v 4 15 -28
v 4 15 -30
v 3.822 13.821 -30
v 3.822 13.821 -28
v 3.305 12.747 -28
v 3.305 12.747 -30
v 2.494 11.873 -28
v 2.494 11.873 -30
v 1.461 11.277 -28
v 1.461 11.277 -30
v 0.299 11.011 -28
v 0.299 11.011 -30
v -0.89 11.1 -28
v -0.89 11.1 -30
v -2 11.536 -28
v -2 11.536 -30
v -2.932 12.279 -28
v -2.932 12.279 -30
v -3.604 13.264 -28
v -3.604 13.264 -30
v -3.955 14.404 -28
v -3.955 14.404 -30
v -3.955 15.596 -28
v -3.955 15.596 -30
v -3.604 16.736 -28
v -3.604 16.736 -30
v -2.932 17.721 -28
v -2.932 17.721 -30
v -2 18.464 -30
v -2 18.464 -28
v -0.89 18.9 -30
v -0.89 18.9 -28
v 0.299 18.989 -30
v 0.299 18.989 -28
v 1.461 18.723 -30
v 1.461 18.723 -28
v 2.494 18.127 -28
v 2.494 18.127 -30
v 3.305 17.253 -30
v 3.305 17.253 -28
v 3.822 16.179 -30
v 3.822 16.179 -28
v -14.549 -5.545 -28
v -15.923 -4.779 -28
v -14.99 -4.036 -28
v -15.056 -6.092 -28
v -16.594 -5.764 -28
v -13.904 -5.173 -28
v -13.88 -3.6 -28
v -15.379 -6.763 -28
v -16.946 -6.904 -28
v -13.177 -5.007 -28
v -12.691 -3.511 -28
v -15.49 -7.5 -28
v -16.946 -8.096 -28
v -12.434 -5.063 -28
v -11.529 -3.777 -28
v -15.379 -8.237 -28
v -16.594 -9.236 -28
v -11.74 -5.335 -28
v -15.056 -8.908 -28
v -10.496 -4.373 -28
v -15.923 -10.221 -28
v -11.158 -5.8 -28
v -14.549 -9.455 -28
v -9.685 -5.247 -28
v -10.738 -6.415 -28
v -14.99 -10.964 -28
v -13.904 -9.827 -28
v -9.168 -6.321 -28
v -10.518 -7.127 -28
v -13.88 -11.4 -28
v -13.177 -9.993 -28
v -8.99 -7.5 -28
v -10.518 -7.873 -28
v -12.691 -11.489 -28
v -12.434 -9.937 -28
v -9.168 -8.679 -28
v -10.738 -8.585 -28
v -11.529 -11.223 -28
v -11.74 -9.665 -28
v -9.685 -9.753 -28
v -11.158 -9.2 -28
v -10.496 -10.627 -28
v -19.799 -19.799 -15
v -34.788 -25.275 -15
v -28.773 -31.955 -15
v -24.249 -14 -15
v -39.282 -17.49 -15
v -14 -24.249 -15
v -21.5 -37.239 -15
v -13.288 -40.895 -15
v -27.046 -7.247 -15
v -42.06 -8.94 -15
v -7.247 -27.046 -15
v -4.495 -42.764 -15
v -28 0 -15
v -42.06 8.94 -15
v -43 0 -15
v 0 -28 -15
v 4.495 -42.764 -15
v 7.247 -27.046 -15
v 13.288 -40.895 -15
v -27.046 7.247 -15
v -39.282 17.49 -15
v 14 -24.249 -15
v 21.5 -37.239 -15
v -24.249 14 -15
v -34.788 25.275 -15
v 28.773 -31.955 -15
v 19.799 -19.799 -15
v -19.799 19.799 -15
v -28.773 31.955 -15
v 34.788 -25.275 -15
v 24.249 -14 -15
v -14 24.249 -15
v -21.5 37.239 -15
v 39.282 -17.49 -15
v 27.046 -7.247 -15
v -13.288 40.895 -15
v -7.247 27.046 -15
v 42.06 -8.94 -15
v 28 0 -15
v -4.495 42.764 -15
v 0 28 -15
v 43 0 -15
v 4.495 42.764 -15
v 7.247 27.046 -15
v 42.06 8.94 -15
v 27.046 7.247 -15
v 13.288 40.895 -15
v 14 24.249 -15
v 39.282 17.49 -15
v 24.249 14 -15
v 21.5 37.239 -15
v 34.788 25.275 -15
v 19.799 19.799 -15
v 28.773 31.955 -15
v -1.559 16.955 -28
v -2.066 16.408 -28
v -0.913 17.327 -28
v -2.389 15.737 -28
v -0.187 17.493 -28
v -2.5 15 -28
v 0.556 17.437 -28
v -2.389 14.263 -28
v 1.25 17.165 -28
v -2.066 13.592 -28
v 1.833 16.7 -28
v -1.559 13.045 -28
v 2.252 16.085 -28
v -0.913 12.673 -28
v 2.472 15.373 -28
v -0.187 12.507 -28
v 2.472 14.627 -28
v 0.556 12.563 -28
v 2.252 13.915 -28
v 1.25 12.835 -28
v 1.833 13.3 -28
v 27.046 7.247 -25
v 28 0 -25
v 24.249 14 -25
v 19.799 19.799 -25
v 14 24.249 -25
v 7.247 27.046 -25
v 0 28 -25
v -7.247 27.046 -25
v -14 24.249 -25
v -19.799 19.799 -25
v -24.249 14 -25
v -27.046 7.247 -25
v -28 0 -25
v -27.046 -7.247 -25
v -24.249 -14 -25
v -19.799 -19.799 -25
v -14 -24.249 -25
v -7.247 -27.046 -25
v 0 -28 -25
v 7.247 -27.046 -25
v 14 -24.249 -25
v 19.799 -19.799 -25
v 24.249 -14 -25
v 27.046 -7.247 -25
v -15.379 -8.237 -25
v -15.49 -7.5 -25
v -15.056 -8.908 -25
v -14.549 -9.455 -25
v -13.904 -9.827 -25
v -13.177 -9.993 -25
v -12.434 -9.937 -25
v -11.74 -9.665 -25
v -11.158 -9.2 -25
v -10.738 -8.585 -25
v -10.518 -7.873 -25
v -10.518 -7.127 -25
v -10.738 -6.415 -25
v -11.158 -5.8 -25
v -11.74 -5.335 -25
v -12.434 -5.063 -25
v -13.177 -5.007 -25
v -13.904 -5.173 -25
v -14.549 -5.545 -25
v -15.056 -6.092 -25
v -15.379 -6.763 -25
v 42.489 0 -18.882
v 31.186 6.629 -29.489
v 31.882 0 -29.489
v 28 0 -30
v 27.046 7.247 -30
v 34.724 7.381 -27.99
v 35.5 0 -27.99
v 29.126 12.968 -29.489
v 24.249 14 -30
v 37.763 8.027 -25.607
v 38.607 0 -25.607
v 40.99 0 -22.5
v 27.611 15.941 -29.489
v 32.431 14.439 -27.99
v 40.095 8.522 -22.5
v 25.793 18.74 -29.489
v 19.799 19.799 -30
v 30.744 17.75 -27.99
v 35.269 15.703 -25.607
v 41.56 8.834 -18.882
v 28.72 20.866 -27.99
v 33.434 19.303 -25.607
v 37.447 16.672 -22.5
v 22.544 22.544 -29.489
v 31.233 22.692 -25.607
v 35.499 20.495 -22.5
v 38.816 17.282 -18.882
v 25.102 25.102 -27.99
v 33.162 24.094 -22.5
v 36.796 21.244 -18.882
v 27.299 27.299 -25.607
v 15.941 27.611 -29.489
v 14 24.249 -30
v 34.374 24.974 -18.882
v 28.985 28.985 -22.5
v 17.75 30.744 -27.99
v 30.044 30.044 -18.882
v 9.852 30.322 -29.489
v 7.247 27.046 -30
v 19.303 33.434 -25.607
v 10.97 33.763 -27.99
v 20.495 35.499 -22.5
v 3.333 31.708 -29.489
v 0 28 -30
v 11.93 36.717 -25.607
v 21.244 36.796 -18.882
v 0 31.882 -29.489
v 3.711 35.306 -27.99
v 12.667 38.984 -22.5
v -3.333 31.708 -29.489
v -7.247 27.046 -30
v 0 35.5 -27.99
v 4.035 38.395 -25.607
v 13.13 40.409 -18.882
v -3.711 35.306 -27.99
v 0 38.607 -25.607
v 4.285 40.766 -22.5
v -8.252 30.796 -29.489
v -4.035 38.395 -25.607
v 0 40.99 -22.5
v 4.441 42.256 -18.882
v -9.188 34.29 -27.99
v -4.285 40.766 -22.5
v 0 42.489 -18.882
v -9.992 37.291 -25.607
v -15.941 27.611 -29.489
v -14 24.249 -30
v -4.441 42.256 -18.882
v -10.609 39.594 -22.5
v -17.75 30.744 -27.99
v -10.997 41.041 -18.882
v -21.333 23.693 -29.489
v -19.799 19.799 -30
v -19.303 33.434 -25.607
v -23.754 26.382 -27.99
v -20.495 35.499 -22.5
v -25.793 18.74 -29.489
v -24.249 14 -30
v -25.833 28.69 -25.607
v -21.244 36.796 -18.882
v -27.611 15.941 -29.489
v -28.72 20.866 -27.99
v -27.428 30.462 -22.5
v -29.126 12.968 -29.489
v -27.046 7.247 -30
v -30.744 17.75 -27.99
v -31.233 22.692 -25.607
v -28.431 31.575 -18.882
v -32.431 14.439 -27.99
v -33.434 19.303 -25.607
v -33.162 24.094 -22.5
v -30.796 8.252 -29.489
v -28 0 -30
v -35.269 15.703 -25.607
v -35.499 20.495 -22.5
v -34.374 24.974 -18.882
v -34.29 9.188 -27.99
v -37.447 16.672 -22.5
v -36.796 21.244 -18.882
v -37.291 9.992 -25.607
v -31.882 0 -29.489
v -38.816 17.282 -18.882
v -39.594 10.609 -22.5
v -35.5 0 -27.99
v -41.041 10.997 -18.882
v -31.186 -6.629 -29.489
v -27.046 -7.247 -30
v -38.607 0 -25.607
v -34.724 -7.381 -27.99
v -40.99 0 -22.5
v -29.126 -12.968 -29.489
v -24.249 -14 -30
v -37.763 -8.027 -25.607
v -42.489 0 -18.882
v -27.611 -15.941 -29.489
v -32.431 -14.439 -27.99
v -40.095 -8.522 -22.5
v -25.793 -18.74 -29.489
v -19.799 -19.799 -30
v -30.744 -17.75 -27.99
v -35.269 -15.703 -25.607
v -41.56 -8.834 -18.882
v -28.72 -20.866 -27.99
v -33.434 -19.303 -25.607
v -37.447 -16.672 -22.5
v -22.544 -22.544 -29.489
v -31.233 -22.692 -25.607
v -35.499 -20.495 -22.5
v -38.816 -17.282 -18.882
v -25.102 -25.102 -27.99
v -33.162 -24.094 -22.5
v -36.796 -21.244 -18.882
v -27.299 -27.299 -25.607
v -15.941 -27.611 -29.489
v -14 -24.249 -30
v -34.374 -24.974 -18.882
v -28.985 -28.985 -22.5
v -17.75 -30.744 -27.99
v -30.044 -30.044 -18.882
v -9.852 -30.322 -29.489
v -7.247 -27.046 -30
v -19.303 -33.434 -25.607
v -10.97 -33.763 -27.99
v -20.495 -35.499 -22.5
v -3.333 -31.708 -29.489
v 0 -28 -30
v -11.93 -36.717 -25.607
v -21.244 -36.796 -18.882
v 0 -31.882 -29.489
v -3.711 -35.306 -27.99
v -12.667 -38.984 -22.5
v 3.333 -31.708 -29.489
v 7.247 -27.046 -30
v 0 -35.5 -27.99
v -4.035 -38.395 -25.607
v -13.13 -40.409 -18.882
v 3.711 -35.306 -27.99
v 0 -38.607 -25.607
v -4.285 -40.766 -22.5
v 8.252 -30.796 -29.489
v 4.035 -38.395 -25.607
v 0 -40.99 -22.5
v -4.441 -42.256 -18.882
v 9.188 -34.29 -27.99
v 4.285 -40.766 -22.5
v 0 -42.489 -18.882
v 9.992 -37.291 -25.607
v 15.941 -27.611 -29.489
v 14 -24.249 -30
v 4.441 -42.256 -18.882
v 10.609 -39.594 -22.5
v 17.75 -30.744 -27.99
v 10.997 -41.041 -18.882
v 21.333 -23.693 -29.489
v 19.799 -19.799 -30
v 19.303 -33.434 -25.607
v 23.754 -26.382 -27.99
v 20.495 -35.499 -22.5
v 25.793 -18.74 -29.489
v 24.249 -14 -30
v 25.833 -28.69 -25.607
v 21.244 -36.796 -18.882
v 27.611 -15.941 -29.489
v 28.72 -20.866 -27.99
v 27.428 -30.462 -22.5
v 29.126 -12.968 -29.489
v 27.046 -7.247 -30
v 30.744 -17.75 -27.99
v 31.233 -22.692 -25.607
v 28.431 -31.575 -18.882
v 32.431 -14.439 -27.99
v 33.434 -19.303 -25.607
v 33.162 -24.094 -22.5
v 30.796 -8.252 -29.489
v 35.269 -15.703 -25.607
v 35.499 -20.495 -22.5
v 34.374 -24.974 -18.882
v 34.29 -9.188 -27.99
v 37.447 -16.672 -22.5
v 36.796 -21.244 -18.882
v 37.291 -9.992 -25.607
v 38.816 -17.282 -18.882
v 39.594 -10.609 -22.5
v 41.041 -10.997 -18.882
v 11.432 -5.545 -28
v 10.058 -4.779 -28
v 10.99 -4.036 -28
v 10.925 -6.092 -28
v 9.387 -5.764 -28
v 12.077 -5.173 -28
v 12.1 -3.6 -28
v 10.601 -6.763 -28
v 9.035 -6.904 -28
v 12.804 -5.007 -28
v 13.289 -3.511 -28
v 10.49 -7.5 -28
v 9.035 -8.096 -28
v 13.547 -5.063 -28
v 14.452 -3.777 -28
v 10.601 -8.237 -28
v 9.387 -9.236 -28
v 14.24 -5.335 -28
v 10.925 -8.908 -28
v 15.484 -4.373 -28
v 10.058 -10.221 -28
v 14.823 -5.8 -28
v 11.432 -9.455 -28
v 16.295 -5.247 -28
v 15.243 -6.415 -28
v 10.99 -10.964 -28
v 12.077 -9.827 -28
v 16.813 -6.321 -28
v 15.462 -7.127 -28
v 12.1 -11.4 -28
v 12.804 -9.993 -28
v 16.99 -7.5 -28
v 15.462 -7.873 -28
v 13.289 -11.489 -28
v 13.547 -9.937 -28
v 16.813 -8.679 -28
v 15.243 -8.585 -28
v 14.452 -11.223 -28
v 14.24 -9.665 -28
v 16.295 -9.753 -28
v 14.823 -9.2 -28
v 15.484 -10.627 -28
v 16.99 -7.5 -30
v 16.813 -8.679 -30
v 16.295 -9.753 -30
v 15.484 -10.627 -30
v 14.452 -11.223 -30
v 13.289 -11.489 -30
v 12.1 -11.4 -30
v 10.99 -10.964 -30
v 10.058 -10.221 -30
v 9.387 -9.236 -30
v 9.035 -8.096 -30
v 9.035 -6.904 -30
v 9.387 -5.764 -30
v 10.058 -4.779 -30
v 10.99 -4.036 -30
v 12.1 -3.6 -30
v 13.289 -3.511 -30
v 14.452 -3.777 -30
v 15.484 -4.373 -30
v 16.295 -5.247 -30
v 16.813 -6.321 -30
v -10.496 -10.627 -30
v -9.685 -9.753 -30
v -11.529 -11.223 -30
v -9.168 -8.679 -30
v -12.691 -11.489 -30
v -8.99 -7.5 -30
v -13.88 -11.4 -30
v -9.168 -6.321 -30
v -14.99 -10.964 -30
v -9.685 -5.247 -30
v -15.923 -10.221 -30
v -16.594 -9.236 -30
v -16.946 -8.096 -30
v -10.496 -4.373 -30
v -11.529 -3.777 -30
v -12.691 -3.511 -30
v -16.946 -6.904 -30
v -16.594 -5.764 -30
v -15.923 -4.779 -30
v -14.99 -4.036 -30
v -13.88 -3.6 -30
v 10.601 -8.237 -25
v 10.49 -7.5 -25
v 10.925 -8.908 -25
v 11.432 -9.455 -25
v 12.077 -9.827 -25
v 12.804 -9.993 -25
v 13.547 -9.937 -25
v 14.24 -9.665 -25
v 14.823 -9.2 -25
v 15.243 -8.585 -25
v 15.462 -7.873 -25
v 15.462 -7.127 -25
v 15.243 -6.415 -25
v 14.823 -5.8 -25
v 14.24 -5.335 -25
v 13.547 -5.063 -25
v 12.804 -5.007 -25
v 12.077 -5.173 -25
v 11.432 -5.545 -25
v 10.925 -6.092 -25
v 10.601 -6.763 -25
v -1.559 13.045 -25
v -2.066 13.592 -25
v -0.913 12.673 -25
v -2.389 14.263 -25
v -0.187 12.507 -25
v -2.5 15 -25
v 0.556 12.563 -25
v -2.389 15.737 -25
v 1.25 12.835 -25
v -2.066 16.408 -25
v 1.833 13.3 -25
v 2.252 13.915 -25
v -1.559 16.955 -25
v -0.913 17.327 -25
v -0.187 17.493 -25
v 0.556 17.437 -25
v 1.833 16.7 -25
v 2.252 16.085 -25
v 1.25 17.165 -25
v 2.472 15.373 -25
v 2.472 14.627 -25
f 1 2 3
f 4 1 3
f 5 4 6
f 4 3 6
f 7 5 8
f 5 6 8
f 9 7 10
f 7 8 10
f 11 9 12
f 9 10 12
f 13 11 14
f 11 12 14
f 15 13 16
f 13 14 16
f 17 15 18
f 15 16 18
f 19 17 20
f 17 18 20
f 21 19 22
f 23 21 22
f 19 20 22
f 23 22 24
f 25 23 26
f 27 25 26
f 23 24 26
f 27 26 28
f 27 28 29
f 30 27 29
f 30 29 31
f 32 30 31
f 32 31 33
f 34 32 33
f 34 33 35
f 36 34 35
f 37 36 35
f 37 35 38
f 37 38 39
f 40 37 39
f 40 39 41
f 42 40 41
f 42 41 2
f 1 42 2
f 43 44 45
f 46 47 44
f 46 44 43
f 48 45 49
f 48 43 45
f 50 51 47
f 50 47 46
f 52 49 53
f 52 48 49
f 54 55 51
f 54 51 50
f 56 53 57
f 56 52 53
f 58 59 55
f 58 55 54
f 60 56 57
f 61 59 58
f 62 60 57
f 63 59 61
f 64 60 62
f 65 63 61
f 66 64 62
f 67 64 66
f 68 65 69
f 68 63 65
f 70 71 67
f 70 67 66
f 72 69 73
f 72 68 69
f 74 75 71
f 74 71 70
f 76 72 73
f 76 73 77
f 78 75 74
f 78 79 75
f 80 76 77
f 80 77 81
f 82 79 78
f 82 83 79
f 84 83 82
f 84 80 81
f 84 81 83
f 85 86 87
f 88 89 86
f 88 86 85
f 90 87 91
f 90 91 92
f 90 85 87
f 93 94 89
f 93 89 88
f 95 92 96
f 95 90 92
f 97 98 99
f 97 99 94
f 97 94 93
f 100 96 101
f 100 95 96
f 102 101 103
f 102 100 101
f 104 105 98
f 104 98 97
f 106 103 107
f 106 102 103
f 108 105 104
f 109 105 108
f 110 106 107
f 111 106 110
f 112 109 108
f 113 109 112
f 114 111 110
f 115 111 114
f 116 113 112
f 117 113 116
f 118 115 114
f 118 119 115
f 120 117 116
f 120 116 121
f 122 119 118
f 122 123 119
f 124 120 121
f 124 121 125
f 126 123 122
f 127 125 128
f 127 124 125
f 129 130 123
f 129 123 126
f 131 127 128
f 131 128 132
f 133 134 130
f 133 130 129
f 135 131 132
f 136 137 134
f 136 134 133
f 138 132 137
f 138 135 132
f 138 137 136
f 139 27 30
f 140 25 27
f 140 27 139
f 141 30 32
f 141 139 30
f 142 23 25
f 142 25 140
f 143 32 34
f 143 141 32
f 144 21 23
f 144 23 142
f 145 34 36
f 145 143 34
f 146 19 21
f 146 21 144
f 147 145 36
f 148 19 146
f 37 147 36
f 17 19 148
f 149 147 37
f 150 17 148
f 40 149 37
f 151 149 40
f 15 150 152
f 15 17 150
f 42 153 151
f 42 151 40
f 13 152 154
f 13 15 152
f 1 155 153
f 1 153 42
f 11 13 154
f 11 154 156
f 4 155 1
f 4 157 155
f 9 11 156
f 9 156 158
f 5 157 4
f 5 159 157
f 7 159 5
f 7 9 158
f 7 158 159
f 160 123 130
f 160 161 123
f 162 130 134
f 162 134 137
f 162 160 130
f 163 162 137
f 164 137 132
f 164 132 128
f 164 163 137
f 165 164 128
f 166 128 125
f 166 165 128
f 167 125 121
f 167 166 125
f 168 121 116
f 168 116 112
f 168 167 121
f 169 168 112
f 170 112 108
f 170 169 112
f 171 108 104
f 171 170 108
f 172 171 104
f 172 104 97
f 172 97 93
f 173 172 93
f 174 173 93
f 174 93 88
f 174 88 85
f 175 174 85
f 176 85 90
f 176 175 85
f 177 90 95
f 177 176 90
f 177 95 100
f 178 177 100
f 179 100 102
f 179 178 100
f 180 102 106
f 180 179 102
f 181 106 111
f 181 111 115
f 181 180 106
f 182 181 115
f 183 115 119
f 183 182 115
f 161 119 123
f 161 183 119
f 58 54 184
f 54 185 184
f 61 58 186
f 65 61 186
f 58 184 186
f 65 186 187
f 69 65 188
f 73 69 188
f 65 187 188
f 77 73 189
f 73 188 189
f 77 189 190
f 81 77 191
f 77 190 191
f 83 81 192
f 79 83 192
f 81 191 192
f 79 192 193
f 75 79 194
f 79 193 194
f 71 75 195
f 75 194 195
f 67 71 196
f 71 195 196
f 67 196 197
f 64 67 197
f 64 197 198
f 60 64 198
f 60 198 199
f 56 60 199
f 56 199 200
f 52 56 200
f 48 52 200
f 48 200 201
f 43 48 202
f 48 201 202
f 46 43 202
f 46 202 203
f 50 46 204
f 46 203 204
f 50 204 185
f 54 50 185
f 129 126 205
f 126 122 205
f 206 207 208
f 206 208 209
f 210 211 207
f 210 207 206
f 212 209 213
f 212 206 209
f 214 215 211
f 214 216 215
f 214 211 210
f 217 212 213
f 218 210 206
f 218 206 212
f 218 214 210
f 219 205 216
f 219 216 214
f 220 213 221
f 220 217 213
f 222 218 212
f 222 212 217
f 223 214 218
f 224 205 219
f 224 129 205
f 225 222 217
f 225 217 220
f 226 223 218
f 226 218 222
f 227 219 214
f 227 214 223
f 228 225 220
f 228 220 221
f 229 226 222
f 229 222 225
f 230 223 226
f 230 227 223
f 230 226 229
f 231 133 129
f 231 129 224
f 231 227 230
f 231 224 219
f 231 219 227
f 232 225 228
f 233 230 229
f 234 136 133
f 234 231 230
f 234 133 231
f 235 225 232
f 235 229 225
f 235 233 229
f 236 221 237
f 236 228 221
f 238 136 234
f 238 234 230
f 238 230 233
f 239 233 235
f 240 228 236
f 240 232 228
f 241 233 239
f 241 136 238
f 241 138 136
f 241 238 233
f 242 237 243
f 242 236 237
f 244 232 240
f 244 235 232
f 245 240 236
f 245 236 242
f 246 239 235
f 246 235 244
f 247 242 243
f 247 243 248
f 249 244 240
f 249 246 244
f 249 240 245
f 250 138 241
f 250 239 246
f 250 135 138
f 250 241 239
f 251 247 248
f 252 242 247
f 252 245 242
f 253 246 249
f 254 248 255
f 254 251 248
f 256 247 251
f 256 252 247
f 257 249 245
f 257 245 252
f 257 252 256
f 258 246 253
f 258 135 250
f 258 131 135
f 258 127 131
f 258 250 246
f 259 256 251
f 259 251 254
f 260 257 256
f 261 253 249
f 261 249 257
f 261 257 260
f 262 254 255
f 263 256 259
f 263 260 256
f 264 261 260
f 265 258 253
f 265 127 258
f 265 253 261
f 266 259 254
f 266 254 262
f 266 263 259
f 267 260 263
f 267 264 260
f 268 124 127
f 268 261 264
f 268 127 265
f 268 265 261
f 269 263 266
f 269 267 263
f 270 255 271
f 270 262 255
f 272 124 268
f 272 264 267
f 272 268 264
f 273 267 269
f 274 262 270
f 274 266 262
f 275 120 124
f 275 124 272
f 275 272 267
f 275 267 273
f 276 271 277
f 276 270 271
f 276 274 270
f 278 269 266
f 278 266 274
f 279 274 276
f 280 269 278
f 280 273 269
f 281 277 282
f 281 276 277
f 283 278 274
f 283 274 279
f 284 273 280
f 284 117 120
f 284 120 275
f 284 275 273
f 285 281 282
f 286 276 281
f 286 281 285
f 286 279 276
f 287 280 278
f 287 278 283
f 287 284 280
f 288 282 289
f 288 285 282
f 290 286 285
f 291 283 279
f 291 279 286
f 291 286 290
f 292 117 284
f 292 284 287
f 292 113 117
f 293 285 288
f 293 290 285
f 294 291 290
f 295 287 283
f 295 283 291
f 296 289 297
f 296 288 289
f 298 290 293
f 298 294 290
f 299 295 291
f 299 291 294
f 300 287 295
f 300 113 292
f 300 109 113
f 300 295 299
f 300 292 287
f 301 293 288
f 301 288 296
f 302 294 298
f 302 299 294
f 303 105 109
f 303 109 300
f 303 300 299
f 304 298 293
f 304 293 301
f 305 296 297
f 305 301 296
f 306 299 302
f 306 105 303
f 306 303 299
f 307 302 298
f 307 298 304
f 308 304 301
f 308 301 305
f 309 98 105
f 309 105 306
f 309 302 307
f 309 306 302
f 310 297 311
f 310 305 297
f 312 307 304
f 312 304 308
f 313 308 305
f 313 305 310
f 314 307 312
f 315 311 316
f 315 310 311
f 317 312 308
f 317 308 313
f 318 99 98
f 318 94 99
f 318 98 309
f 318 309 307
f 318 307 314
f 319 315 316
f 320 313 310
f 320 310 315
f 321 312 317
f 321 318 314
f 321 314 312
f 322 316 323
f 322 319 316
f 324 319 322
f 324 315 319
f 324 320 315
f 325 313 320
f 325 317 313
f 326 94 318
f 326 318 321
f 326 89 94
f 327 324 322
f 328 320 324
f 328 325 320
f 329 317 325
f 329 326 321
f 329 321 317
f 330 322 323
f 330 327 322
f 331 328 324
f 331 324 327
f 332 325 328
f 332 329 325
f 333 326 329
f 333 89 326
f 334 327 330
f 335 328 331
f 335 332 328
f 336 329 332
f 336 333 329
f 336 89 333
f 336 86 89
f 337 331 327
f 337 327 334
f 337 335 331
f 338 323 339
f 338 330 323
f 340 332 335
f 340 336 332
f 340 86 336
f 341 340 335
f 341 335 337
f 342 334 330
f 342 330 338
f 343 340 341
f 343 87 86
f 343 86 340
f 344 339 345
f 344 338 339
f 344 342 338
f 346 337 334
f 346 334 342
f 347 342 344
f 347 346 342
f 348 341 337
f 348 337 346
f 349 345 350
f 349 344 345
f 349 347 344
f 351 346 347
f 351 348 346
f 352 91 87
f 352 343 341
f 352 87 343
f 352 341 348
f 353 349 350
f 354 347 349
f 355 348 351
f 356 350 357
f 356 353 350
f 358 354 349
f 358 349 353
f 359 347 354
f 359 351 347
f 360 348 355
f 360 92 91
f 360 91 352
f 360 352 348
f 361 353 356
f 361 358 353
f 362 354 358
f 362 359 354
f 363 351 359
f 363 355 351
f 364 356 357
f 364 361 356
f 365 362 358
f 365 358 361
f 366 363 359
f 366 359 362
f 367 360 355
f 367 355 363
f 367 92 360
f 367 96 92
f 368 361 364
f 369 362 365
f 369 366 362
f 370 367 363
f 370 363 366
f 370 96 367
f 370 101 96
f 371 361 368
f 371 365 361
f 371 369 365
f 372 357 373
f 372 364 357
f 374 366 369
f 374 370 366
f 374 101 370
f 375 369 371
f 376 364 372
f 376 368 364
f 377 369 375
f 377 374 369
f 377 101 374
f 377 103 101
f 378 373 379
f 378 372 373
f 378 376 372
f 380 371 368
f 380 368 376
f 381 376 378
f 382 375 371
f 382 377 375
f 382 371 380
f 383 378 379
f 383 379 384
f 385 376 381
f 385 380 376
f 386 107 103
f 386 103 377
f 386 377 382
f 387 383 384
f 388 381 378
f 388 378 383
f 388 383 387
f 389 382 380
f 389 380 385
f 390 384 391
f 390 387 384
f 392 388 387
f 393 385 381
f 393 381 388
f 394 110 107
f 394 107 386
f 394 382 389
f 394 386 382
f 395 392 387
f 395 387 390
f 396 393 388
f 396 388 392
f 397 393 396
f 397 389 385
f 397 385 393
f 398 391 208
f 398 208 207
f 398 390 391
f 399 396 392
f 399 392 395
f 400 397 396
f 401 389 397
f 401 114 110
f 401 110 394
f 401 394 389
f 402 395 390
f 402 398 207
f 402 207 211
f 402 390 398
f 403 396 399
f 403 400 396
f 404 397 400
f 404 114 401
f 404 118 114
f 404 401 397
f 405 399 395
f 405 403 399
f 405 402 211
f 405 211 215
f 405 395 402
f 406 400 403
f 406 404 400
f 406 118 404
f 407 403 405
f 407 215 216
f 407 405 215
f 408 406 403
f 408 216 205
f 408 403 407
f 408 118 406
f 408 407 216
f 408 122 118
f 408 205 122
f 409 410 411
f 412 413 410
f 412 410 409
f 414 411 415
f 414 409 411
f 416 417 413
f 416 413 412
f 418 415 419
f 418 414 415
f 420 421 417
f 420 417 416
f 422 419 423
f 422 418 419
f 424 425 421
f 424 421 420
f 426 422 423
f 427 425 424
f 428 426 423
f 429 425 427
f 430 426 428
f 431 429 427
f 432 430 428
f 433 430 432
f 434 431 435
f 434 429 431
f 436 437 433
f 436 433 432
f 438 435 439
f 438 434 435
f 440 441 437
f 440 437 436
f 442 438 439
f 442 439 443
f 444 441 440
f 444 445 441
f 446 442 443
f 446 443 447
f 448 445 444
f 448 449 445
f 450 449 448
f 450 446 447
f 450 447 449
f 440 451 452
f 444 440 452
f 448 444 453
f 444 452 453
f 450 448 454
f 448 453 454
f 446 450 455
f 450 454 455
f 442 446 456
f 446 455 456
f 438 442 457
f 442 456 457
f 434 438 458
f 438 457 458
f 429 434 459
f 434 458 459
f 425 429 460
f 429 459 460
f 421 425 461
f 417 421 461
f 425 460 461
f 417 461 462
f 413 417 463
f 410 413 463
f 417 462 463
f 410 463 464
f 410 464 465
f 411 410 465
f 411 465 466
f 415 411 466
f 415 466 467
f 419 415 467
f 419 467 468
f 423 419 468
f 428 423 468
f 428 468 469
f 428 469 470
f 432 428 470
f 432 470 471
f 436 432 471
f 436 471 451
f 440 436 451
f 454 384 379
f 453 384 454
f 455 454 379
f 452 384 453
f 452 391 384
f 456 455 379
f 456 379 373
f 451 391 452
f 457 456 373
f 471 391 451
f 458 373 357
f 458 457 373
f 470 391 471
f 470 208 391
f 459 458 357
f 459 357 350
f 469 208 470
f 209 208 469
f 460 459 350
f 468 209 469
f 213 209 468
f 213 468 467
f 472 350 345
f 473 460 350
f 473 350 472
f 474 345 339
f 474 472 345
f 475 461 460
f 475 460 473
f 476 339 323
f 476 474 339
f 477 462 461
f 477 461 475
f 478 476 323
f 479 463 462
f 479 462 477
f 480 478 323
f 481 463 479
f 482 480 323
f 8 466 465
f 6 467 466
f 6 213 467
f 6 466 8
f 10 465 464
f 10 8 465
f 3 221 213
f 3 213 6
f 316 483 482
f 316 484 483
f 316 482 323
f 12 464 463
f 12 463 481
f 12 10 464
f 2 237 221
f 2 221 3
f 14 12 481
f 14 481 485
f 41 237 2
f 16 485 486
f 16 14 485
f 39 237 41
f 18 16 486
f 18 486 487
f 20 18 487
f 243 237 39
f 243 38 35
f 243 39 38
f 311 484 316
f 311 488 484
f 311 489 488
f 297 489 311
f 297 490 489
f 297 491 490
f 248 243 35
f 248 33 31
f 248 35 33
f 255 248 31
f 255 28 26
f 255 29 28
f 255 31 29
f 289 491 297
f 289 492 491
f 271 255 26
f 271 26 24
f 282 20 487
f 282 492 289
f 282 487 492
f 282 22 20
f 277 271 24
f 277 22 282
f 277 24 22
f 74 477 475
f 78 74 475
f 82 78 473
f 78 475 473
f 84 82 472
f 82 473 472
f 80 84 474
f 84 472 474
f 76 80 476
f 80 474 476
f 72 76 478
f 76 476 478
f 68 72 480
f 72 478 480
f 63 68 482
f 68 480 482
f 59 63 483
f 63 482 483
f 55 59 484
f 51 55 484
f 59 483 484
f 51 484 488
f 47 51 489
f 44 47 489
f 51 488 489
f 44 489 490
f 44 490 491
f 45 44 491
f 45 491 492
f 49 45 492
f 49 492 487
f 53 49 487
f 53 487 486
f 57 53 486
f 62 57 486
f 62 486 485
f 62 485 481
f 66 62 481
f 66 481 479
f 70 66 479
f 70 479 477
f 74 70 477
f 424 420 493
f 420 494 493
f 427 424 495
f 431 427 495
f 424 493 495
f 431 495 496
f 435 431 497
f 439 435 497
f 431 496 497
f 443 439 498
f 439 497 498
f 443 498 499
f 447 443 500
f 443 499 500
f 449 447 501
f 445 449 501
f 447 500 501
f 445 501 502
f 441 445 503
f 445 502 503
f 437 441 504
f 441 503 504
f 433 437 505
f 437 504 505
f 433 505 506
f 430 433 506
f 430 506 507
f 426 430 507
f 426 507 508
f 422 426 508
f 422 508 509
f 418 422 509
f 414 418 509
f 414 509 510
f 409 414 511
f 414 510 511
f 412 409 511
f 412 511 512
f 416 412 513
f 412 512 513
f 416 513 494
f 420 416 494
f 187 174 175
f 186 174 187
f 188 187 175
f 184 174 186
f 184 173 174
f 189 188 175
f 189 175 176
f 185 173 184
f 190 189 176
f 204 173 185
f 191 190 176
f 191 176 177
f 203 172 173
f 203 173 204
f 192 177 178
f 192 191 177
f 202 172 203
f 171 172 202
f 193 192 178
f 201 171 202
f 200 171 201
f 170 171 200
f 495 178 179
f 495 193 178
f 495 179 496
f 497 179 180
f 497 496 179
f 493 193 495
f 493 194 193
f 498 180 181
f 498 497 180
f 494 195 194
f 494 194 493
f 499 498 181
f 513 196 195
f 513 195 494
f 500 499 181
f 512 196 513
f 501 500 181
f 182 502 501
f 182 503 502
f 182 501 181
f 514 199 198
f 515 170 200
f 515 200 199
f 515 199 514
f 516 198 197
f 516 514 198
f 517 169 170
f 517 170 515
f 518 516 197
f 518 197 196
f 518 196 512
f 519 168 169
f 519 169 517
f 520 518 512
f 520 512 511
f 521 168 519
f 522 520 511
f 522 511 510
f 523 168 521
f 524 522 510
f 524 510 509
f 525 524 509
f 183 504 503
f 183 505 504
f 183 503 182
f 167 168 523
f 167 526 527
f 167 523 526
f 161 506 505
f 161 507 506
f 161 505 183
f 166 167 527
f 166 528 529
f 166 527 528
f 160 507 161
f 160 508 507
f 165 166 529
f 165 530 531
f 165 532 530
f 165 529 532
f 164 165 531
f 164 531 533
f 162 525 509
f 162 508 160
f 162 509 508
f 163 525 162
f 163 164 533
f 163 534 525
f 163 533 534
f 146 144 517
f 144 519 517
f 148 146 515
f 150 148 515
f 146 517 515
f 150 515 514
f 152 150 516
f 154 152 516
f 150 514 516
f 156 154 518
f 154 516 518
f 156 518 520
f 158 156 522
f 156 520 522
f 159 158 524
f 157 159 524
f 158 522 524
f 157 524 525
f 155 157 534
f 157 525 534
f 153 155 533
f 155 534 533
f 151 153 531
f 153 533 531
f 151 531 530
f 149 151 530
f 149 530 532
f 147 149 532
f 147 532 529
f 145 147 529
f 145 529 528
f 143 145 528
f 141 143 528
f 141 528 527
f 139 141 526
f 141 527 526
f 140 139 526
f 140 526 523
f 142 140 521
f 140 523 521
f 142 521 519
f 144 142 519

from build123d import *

# Parameters (mm, degrees)
F2_R           = 14.99999
F4_D           = 5
F4_CBORE_D     = 8
F4_CBORE_DEPTH = 2


# Not quite as in the source:
# - a fillet or chamfer is up to 0.001 mm smaller than in the source, because OpenCascade refuses the exact size


with BuildPart() as f1:
    # F0 (on Front) → F1 (revolve)
    with BuildSketch(Plane.XZ):
        Polygon((28, -25), (0, -25), (0, -30), (43, -30), (43, -15), (28, -15), align=None)
    revolve(axis=Axis((0, 0, -27.5), (0, 0, 1)))

    # F2 (radius 15 in the source; OpenCascade refuses exactly that, so slightly less here)
    f2_edges = [f1.edges().sort_by_distance(p)[0] for p in [
        (-43, 0, -30),
    ]]
    fillet(f2_edges, radius=F2_R)

    # F4 (through all)
    with Locations(Plane(origin=(0, 0, -30), x_dir=(1, 0, 0), z_dir=(0, 0, -1))):
        with Locations((-12.9903810568, 7.5), (12.9903810568, 7.5), (0, -15)):
            CounterBoreHole(F4_D / 2, F4_CBORE_D / 2, F4_CBORE_DEPTH)


solid = f1.part
